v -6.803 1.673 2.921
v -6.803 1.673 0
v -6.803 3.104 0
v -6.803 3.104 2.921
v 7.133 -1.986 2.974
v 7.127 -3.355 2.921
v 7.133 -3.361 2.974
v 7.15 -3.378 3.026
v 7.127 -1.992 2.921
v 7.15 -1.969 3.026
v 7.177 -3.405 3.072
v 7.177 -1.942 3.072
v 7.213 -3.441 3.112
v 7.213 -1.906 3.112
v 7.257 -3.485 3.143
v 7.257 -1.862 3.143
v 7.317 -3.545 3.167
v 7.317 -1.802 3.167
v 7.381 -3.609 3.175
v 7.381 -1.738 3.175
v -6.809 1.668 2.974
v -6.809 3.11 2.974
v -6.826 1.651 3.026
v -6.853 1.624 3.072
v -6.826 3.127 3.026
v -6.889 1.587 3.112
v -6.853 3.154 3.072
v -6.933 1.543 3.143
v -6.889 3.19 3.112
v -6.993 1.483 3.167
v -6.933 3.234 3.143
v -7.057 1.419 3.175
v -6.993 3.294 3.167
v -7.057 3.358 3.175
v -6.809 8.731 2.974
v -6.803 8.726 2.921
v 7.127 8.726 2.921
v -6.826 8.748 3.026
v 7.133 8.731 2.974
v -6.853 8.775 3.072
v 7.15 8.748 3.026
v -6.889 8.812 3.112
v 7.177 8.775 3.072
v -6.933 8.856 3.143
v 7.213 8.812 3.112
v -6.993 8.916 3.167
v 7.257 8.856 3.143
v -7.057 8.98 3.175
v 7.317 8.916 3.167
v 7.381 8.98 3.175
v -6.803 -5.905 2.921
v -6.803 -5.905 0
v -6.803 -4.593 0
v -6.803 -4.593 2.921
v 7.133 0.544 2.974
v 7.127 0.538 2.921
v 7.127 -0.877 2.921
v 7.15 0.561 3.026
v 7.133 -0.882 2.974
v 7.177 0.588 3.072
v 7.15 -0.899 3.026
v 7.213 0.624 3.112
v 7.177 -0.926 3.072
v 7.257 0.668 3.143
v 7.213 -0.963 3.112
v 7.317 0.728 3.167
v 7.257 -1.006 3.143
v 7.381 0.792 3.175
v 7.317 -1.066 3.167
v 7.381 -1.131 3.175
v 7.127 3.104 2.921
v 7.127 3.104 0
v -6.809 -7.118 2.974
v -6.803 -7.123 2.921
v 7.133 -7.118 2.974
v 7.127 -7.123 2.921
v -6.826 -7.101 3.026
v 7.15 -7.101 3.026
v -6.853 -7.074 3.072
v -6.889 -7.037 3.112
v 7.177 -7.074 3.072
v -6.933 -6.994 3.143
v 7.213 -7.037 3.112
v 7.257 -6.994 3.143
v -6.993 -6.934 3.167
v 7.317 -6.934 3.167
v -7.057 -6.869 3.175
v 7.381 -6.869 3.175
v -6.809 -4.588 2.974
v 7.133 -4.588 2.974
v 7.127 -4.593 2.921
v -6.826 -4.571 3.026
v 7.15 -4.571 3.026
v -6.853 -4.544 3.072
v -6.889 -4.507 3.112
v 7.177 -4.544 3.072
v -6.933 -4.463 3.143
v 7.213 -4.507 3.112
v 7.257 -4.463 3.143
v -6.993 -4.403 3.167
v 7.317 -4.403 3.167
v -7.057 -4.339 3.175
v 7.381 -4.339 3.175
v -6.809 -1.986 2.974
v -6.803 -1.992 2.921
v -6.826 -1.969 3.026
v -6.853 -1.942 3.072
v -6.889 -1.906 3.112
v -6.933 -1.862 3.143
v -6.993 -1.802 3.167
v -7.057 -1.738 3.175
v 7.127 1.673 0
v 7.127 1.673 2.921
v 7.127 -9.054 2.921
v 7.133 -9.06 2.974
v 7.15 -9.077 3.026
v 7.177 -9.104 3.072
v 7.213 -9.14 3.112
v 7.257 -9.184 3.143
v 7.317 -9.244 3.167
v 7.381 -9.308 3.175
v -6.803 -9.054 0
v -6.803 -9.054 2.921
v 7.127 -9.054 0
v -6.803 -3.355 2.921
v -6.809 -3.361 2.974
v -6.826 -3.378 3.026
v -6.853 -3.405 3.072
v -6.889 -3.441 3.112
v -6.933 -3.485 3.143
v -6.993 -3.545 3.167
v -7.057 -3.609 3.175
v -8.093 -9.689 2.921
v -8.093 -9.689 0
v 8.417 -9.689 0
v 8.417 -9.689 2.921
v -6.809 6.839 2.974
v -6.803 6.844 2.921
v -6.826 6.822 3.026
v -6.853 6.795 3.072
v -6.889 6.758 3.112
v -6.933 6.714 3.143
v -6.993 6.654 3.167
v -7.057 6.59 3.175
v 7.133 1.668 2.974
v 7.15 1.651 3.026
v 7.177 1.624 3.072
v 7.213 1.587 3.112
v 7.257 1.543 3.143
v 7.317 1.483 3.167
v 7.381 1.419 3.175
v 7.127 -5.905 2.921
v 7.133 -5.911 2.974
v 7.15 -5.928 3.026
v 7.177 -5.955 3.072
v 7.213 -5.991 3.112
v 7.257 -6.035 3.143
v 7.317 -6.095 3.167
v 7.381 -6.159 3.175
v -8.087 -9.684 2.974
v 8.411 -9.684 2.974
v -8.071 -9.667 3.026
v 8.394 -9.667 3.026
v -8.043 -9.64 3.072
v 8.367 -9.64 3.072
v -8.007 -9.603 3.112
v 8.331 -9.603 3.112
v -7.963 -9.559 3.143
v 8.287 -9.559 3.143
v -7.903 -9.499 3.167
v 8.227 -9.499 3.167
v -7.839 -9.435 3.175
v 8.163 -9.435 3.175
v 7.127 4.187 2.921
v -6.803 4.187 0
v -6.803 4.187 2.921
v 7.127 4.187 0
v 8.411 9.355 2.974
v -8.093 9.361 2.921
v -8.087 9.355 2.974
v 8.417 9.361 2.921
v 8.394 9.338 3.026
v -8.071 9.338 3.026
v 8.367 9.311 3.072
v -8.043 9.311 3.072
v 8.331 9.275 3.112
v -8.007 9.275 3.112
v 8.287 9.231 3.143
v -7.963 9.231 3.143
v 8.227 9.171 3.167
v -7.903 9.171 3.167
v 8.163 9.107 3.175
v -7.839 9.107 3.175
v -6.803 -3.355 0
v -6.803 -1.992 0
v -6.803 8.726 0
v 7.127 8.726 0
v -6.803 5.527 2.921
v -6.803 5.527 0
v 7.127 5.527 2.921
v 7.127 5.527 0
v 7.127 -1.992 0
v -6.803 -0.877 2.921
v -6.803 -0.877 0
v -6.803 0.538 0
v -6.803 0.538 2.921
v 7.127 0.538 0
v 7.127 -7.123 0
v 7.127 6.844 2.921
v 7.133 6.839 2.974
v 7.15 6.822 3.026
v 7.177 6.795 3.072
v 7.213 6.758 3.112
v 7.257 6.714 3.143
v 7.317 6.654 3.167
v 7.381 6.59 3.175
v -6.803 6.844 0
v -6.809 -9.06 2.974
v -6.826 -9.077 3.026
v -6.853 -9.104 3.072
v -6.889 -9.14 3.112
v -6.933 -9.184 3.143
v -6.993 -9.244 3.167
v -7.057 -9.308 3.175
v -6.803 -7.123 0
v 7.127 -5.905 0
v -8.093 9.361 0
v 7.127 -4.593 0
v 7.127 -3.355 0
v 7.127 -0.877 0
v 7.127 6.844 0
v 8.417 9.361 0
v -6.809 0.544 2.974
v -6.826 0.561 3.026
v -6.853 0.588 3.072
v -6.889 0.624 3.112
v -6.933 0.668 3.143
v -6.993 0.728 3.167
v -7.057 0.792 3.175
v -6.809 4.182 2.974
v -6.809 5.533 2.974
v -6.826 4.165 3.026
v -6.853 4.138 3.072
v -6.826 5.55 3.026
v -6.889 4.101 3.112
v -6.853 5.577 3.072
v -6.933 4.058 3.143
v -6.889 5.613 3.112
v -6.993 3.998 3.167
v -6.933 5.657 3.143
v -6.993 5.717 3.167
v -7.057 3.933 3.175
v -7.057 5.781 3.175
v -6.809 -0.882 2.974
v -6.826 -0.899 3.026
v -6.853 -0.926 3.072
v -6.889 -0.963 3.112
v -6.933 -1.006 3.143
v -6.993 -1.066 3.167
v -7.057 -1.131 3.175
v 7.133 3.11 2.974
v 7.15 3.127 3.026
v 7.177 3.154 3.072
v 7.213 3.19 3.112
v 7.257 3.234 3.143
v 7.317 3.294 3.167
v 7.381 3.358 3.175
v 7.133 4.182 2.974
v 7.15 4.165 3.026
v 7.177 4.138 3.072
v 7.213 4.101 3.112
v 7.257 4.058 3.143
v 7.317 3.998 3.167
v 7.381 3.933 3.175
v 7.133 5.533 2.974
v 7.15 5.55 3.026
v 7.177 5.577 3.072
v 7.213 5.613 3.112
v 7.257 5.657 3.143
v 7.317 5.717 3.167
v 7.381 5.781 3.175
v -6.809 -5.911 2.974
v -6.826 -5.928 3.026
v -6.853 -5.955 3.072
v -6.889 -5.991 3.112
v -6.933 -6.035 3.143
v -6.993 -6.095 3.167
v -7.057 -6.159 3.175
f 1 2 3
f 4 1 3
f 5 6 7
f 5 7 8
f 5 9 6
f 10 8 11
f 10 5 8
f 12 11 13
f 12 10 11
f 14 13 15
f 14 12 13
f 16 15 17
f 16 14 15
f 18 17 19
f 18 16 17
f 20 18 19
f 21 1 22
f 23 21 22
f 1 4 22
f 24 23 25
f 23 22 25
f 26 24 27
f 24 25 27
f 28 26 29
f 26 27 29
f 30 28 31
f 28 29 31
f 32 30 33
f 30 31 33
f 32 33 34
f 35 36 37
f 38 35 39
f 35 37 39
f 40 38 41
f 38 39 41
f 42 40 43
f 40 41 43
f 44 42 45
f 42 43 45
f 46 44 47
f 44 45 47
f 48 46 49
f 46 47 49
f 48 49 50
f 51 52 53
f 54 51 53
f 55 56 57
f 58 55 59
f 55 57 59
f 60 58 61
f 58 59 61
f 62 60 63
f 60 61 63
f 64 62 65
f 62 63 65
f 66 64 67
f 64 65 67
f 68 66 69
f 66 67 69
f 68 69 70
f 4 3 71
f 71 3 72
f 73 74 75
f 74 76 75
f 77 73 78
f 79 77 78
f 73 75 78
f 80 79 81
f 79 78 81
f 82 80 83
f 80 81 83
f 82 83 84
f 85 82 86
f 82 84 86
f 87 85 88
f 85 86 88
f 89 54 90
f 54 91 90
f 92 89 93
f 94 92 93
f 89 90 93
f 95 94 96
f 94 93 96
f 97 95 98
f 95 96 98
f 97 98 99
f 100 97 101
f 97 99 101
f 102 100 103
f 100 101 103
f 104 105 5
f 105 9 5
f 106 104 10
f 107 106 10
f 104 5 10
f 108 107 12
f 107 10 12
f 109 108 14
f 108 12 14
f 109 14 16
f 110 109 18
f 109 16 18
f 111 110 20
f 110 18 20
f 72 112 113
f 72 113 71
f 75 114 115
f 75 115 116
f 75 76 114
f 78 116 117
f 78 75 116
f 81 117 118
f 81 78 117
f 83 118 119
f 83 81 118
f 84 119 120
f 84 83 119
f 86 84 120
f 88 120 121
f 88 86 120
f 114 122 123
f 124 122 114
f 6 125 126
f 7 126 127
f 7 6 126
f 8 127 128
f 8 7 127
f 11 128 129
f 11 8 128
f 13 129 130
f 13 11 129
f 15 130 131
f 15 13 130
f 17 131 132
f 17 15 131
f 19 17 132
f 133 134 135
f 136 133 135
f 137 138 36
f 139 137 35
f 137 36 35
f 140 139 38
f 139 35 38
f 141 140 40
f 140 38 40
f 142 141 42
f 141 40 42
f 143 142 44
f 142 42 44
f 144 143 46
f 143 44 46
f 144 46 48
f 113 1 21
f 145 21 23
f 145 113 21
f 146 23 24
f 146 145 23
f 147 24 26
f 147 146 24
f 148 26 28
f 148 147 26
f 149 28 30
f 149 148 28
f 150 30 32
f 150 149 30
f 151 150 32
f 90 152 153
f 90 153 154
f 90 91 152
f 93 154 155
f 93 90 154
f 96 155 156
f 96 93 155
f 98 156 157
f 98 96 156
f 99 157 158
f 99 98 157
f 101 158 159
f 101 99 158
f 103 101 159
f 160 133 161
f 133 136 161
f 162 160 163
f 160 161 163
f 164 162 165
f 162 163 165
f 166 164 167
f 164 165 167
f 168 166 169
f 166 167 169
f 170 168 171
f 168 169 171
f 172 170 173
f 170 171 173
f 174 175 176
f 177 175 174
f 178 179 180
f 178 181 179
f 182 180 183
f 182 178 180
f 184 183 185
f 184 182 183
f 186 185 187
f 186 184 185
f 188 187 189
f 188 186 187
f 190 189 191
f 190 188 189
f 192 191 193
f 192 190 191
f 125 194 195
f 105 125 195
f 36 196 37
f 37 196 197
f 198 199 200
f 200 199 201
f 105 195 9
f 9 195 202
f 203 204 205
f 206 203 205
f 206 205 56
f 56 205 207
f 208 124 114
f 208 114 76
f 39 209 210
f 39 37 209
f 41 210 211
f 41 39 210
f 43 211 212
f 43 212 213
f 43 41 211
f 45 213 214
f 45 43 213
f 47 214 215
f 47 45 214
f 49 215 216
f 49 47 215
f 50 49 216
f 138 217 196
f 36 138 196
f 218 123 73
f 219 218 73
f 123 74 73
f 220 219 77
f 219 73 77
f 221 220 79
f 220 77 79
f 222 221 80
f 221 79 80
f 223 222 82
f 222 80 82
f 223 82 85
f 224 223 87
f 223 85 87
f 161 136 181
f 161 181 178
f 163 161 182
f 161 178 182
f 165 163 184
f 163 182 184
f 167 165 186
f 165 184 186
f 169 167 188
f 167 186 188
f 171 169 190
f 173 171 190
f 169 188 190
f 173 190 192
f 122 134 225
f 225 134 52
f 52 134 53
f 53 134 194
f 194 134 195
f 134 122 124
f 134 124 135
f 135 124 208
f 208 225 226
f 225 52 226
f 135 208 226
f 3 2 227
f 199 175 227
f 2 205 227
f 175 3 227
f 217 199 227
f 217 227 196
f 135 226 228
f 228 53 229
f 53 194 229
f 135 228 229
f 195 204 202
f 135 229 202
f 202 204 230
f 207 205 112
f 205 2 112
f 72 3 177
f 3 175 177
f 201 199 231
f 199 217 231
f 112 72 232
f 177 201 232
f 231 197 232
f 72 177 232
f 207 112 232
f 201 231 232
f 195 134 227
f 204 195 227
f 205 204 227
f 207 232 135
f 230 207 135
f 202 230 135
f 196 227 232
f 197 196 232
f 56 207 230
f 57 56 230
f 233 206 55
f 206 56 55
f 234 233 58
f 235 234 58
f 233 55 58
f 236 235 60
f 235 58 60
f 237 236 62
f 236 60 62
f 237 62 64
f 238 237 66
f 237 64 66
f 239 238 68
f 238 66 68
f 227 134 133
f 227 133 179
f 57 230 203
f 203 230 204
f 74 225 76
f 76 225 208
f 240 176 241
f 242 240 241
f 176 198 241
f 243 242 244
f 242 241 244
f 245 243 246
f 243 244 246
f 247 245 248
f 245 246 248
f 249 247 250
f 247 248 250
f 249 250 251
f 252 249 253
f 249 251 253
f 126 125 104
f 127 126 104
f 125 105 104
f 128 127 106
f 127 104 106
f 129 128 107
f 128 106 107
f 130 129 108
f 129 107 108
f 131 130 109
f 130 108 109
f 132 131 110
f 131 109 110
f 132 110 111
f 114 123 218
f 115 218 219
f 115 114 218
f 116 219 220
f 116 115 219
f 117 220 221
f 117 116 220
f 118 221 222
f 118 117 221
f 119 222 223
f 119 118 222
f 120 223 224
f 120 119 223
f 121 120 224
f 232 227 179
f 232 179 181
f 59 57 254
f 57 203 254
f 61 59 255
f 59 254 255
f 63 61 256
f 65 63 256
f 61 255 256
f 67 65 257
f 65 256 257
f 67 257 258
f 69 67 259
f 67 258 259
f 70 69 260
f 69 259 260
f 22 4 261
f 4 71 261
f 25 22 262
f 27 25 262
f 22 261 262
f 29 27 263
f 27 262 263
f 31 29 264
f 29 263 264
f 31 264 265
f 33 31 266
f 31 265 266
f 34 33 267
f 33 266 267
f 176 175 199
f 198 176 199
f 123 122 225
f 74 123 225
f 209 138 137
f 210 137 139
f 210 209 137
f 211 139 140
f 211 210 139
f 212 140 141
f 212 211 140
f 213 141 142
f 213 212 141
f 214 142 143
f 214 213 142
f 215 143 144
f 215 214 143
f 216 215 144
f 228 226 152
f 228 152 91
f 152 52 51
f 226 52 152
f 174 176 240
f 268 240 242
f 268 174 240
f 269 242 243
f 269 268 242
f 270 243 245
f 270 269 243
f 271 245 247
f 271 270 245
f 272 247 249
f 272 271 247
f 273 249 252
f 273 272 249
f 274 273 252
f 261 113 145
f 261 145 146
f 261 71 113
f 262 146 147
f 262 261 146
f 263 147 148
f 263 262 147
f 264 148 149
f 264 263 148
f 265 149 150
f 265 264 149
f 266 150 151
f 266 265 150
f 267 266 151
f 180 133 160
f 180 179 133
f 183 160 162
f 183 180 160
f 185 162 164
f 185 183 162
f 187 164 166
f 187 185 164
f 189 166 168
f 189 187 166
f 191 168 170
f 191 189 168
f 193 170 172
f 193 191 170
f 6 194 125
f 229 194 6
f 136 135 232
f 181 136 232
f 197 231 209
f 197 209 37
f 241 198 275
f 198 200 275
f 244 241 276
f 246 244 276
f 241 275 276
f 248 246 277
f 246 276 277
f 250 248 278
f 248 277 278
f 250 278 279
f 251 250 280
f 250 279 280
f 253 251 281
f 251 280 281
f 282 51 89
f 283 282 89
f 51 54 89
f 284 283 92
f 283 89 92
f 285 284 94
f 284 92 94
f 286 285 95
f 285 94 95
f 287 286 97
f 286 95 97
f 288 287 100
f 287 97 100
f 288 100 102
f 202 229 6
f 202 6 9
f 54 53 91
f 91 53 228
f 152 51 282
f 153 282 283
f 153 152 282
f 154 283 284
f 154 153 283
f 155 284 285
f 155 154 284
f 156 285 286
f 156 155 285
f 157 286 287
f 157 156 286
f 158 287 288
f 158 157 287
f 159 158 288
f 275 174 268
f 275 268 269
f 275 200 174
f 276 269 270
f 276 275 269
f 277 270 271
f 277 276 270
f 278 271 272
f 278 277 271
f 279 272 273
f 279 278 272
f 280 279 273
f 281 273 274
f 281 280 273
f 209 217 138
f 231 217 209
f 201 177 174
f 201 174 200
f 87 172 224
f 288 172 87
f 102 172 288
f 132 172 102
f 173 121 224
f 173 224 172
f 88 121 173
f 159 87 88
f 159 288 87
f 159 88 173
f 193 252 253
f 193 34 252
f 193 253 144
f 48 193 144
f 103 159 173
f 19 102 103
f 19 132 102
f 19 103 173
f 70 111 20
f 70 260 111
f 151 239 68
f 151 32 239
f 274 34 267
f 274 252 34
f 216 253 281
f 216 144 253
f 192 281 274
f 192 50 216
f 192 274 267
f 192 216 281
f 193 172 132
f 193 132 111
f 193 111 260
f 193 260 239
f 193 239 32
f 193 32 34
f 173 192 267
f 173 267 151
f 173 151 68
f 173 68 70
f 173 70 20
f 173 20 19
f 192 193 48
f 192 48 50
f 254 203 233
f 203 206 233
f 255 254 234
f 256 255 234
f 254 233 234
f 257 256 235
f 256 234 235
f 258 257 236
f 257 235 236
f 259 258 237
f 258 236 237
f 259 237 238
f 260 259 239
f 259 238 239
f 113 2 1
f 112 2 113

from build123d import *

# Parameters (mm, degrees)
F0_W     = 16.51
F0_H     = 19.05
F0_W_2   = 13.9302
F0_H_2   = 1.930798
F0_H_3   = 1.311754
F0_H_4   = 1.36334
F0_H_5   = 1.430876
F0_H_6   = 1.339917
F0_H_7   = 1.881583
F1_DEPTH = 3.175
F2_R     = 0.254


with BuildPart() as f1:
    # F0 (on Top) → F1 (new body)
    with BuildSketch(Plane.XY):
        with Locations((0.161979, -0.164203)):
            Rectangle(F0_W, F0_H)
        with Locations((0.161979, -8.088804)):
            Rectangle(F0_W_2, F0_H_2, mode=Mode.SUBTRACT)
        with Locations((0.161979, -5.249125)):
            Rectangle(F0_W_2, F0_H_3, mode=Mode.SUBTRACT)
        with Locations((0.161979, -2.673489)):
            Rectangle(F0_W_2, F0_H_4, mode=Mode.SUBTRACT)
        Polygon((-6.803121, 0.538338), (7.127079, 0.538338), (7.127079, -0.876588), (-6.803121, -0.876588), (-6.803121, -0.164203), align=None, mode=Mode.SUBTRACT)
        with Locations((0.161979, 2.388693)):
            Rectangle(F0_W_2, F0_H_5, mode=Mode.SUBTRACT)
        with Locations((0.161979, 4.85742)):
            Rectangle(F0_W_2, F0_H_6, mode=Mode.SUBTRACT)
        with Locations((0.161979, 7.785006)):
            Rectangle(F0_W_2, F0_H_7, mode=Mode.SUBTRACT)
    extrude(amount=F1_DEPTH)

    # F2
    f2_edges = [f1.edges().sort_by_distance(p)[0] for p in [
        (-8.093021, -0.164203, 3.175),
        (0.161979, -9.689203, 3.175),
        (8.416979, -0.164203, 3.175),
        (0.161979, 9.360797, 3.175),
        (-6.803121, -8.088804, 3.175),
        (0.161979, -7.123405, 3.175),
        (7.127079, -8.088804, 3.175),
        (0.161979, -9.054203, 3.175),
        (0.161979, -4.593248, 3.175),
        (7.127079, -5.249125, 3.175),
        (0.161979, -5.905002, 3.175),
        (-6.803121, -5.249125, 3.175),
        (0.161979, -1.991819, 3.175),
        (7.127079, -2.673489, 3.175),
        (0.161979, -3.355159, 3.175),
        (-6.803121, -2.673489, 3.175),
        (0.161979, 0.538338, 3.175),
        (7.127079, -0.169125, 3.175),
        (0.161979, -0.876588, 3.175),
        (-6.803121, -0.169125, 3.175),
        (-6.803121, 2.388693, 3.175),
        (0.161979, 3.104131, 3.175),
        (7.127079, 2.388693, 3.175),
        (0.161979, 1.673255, 3.175),
        (0.161979, 5.527379, 3.175),
        (7.127079, 4.857421, 3.175),
        (0.161979, 4.187462, 3.175),
        (-6.803121, 4.857421, 3.175),
        (7.127079, 7.785005, 3.175),
        (0.161979, 6.844214, 3.175),
        (-6.803121, 7.785005, 3.175),
        (0.161979, 8.725797, 3.175),
    ]]
    fillet(f2_edges, radius=F2_R)


solid = f1.part
